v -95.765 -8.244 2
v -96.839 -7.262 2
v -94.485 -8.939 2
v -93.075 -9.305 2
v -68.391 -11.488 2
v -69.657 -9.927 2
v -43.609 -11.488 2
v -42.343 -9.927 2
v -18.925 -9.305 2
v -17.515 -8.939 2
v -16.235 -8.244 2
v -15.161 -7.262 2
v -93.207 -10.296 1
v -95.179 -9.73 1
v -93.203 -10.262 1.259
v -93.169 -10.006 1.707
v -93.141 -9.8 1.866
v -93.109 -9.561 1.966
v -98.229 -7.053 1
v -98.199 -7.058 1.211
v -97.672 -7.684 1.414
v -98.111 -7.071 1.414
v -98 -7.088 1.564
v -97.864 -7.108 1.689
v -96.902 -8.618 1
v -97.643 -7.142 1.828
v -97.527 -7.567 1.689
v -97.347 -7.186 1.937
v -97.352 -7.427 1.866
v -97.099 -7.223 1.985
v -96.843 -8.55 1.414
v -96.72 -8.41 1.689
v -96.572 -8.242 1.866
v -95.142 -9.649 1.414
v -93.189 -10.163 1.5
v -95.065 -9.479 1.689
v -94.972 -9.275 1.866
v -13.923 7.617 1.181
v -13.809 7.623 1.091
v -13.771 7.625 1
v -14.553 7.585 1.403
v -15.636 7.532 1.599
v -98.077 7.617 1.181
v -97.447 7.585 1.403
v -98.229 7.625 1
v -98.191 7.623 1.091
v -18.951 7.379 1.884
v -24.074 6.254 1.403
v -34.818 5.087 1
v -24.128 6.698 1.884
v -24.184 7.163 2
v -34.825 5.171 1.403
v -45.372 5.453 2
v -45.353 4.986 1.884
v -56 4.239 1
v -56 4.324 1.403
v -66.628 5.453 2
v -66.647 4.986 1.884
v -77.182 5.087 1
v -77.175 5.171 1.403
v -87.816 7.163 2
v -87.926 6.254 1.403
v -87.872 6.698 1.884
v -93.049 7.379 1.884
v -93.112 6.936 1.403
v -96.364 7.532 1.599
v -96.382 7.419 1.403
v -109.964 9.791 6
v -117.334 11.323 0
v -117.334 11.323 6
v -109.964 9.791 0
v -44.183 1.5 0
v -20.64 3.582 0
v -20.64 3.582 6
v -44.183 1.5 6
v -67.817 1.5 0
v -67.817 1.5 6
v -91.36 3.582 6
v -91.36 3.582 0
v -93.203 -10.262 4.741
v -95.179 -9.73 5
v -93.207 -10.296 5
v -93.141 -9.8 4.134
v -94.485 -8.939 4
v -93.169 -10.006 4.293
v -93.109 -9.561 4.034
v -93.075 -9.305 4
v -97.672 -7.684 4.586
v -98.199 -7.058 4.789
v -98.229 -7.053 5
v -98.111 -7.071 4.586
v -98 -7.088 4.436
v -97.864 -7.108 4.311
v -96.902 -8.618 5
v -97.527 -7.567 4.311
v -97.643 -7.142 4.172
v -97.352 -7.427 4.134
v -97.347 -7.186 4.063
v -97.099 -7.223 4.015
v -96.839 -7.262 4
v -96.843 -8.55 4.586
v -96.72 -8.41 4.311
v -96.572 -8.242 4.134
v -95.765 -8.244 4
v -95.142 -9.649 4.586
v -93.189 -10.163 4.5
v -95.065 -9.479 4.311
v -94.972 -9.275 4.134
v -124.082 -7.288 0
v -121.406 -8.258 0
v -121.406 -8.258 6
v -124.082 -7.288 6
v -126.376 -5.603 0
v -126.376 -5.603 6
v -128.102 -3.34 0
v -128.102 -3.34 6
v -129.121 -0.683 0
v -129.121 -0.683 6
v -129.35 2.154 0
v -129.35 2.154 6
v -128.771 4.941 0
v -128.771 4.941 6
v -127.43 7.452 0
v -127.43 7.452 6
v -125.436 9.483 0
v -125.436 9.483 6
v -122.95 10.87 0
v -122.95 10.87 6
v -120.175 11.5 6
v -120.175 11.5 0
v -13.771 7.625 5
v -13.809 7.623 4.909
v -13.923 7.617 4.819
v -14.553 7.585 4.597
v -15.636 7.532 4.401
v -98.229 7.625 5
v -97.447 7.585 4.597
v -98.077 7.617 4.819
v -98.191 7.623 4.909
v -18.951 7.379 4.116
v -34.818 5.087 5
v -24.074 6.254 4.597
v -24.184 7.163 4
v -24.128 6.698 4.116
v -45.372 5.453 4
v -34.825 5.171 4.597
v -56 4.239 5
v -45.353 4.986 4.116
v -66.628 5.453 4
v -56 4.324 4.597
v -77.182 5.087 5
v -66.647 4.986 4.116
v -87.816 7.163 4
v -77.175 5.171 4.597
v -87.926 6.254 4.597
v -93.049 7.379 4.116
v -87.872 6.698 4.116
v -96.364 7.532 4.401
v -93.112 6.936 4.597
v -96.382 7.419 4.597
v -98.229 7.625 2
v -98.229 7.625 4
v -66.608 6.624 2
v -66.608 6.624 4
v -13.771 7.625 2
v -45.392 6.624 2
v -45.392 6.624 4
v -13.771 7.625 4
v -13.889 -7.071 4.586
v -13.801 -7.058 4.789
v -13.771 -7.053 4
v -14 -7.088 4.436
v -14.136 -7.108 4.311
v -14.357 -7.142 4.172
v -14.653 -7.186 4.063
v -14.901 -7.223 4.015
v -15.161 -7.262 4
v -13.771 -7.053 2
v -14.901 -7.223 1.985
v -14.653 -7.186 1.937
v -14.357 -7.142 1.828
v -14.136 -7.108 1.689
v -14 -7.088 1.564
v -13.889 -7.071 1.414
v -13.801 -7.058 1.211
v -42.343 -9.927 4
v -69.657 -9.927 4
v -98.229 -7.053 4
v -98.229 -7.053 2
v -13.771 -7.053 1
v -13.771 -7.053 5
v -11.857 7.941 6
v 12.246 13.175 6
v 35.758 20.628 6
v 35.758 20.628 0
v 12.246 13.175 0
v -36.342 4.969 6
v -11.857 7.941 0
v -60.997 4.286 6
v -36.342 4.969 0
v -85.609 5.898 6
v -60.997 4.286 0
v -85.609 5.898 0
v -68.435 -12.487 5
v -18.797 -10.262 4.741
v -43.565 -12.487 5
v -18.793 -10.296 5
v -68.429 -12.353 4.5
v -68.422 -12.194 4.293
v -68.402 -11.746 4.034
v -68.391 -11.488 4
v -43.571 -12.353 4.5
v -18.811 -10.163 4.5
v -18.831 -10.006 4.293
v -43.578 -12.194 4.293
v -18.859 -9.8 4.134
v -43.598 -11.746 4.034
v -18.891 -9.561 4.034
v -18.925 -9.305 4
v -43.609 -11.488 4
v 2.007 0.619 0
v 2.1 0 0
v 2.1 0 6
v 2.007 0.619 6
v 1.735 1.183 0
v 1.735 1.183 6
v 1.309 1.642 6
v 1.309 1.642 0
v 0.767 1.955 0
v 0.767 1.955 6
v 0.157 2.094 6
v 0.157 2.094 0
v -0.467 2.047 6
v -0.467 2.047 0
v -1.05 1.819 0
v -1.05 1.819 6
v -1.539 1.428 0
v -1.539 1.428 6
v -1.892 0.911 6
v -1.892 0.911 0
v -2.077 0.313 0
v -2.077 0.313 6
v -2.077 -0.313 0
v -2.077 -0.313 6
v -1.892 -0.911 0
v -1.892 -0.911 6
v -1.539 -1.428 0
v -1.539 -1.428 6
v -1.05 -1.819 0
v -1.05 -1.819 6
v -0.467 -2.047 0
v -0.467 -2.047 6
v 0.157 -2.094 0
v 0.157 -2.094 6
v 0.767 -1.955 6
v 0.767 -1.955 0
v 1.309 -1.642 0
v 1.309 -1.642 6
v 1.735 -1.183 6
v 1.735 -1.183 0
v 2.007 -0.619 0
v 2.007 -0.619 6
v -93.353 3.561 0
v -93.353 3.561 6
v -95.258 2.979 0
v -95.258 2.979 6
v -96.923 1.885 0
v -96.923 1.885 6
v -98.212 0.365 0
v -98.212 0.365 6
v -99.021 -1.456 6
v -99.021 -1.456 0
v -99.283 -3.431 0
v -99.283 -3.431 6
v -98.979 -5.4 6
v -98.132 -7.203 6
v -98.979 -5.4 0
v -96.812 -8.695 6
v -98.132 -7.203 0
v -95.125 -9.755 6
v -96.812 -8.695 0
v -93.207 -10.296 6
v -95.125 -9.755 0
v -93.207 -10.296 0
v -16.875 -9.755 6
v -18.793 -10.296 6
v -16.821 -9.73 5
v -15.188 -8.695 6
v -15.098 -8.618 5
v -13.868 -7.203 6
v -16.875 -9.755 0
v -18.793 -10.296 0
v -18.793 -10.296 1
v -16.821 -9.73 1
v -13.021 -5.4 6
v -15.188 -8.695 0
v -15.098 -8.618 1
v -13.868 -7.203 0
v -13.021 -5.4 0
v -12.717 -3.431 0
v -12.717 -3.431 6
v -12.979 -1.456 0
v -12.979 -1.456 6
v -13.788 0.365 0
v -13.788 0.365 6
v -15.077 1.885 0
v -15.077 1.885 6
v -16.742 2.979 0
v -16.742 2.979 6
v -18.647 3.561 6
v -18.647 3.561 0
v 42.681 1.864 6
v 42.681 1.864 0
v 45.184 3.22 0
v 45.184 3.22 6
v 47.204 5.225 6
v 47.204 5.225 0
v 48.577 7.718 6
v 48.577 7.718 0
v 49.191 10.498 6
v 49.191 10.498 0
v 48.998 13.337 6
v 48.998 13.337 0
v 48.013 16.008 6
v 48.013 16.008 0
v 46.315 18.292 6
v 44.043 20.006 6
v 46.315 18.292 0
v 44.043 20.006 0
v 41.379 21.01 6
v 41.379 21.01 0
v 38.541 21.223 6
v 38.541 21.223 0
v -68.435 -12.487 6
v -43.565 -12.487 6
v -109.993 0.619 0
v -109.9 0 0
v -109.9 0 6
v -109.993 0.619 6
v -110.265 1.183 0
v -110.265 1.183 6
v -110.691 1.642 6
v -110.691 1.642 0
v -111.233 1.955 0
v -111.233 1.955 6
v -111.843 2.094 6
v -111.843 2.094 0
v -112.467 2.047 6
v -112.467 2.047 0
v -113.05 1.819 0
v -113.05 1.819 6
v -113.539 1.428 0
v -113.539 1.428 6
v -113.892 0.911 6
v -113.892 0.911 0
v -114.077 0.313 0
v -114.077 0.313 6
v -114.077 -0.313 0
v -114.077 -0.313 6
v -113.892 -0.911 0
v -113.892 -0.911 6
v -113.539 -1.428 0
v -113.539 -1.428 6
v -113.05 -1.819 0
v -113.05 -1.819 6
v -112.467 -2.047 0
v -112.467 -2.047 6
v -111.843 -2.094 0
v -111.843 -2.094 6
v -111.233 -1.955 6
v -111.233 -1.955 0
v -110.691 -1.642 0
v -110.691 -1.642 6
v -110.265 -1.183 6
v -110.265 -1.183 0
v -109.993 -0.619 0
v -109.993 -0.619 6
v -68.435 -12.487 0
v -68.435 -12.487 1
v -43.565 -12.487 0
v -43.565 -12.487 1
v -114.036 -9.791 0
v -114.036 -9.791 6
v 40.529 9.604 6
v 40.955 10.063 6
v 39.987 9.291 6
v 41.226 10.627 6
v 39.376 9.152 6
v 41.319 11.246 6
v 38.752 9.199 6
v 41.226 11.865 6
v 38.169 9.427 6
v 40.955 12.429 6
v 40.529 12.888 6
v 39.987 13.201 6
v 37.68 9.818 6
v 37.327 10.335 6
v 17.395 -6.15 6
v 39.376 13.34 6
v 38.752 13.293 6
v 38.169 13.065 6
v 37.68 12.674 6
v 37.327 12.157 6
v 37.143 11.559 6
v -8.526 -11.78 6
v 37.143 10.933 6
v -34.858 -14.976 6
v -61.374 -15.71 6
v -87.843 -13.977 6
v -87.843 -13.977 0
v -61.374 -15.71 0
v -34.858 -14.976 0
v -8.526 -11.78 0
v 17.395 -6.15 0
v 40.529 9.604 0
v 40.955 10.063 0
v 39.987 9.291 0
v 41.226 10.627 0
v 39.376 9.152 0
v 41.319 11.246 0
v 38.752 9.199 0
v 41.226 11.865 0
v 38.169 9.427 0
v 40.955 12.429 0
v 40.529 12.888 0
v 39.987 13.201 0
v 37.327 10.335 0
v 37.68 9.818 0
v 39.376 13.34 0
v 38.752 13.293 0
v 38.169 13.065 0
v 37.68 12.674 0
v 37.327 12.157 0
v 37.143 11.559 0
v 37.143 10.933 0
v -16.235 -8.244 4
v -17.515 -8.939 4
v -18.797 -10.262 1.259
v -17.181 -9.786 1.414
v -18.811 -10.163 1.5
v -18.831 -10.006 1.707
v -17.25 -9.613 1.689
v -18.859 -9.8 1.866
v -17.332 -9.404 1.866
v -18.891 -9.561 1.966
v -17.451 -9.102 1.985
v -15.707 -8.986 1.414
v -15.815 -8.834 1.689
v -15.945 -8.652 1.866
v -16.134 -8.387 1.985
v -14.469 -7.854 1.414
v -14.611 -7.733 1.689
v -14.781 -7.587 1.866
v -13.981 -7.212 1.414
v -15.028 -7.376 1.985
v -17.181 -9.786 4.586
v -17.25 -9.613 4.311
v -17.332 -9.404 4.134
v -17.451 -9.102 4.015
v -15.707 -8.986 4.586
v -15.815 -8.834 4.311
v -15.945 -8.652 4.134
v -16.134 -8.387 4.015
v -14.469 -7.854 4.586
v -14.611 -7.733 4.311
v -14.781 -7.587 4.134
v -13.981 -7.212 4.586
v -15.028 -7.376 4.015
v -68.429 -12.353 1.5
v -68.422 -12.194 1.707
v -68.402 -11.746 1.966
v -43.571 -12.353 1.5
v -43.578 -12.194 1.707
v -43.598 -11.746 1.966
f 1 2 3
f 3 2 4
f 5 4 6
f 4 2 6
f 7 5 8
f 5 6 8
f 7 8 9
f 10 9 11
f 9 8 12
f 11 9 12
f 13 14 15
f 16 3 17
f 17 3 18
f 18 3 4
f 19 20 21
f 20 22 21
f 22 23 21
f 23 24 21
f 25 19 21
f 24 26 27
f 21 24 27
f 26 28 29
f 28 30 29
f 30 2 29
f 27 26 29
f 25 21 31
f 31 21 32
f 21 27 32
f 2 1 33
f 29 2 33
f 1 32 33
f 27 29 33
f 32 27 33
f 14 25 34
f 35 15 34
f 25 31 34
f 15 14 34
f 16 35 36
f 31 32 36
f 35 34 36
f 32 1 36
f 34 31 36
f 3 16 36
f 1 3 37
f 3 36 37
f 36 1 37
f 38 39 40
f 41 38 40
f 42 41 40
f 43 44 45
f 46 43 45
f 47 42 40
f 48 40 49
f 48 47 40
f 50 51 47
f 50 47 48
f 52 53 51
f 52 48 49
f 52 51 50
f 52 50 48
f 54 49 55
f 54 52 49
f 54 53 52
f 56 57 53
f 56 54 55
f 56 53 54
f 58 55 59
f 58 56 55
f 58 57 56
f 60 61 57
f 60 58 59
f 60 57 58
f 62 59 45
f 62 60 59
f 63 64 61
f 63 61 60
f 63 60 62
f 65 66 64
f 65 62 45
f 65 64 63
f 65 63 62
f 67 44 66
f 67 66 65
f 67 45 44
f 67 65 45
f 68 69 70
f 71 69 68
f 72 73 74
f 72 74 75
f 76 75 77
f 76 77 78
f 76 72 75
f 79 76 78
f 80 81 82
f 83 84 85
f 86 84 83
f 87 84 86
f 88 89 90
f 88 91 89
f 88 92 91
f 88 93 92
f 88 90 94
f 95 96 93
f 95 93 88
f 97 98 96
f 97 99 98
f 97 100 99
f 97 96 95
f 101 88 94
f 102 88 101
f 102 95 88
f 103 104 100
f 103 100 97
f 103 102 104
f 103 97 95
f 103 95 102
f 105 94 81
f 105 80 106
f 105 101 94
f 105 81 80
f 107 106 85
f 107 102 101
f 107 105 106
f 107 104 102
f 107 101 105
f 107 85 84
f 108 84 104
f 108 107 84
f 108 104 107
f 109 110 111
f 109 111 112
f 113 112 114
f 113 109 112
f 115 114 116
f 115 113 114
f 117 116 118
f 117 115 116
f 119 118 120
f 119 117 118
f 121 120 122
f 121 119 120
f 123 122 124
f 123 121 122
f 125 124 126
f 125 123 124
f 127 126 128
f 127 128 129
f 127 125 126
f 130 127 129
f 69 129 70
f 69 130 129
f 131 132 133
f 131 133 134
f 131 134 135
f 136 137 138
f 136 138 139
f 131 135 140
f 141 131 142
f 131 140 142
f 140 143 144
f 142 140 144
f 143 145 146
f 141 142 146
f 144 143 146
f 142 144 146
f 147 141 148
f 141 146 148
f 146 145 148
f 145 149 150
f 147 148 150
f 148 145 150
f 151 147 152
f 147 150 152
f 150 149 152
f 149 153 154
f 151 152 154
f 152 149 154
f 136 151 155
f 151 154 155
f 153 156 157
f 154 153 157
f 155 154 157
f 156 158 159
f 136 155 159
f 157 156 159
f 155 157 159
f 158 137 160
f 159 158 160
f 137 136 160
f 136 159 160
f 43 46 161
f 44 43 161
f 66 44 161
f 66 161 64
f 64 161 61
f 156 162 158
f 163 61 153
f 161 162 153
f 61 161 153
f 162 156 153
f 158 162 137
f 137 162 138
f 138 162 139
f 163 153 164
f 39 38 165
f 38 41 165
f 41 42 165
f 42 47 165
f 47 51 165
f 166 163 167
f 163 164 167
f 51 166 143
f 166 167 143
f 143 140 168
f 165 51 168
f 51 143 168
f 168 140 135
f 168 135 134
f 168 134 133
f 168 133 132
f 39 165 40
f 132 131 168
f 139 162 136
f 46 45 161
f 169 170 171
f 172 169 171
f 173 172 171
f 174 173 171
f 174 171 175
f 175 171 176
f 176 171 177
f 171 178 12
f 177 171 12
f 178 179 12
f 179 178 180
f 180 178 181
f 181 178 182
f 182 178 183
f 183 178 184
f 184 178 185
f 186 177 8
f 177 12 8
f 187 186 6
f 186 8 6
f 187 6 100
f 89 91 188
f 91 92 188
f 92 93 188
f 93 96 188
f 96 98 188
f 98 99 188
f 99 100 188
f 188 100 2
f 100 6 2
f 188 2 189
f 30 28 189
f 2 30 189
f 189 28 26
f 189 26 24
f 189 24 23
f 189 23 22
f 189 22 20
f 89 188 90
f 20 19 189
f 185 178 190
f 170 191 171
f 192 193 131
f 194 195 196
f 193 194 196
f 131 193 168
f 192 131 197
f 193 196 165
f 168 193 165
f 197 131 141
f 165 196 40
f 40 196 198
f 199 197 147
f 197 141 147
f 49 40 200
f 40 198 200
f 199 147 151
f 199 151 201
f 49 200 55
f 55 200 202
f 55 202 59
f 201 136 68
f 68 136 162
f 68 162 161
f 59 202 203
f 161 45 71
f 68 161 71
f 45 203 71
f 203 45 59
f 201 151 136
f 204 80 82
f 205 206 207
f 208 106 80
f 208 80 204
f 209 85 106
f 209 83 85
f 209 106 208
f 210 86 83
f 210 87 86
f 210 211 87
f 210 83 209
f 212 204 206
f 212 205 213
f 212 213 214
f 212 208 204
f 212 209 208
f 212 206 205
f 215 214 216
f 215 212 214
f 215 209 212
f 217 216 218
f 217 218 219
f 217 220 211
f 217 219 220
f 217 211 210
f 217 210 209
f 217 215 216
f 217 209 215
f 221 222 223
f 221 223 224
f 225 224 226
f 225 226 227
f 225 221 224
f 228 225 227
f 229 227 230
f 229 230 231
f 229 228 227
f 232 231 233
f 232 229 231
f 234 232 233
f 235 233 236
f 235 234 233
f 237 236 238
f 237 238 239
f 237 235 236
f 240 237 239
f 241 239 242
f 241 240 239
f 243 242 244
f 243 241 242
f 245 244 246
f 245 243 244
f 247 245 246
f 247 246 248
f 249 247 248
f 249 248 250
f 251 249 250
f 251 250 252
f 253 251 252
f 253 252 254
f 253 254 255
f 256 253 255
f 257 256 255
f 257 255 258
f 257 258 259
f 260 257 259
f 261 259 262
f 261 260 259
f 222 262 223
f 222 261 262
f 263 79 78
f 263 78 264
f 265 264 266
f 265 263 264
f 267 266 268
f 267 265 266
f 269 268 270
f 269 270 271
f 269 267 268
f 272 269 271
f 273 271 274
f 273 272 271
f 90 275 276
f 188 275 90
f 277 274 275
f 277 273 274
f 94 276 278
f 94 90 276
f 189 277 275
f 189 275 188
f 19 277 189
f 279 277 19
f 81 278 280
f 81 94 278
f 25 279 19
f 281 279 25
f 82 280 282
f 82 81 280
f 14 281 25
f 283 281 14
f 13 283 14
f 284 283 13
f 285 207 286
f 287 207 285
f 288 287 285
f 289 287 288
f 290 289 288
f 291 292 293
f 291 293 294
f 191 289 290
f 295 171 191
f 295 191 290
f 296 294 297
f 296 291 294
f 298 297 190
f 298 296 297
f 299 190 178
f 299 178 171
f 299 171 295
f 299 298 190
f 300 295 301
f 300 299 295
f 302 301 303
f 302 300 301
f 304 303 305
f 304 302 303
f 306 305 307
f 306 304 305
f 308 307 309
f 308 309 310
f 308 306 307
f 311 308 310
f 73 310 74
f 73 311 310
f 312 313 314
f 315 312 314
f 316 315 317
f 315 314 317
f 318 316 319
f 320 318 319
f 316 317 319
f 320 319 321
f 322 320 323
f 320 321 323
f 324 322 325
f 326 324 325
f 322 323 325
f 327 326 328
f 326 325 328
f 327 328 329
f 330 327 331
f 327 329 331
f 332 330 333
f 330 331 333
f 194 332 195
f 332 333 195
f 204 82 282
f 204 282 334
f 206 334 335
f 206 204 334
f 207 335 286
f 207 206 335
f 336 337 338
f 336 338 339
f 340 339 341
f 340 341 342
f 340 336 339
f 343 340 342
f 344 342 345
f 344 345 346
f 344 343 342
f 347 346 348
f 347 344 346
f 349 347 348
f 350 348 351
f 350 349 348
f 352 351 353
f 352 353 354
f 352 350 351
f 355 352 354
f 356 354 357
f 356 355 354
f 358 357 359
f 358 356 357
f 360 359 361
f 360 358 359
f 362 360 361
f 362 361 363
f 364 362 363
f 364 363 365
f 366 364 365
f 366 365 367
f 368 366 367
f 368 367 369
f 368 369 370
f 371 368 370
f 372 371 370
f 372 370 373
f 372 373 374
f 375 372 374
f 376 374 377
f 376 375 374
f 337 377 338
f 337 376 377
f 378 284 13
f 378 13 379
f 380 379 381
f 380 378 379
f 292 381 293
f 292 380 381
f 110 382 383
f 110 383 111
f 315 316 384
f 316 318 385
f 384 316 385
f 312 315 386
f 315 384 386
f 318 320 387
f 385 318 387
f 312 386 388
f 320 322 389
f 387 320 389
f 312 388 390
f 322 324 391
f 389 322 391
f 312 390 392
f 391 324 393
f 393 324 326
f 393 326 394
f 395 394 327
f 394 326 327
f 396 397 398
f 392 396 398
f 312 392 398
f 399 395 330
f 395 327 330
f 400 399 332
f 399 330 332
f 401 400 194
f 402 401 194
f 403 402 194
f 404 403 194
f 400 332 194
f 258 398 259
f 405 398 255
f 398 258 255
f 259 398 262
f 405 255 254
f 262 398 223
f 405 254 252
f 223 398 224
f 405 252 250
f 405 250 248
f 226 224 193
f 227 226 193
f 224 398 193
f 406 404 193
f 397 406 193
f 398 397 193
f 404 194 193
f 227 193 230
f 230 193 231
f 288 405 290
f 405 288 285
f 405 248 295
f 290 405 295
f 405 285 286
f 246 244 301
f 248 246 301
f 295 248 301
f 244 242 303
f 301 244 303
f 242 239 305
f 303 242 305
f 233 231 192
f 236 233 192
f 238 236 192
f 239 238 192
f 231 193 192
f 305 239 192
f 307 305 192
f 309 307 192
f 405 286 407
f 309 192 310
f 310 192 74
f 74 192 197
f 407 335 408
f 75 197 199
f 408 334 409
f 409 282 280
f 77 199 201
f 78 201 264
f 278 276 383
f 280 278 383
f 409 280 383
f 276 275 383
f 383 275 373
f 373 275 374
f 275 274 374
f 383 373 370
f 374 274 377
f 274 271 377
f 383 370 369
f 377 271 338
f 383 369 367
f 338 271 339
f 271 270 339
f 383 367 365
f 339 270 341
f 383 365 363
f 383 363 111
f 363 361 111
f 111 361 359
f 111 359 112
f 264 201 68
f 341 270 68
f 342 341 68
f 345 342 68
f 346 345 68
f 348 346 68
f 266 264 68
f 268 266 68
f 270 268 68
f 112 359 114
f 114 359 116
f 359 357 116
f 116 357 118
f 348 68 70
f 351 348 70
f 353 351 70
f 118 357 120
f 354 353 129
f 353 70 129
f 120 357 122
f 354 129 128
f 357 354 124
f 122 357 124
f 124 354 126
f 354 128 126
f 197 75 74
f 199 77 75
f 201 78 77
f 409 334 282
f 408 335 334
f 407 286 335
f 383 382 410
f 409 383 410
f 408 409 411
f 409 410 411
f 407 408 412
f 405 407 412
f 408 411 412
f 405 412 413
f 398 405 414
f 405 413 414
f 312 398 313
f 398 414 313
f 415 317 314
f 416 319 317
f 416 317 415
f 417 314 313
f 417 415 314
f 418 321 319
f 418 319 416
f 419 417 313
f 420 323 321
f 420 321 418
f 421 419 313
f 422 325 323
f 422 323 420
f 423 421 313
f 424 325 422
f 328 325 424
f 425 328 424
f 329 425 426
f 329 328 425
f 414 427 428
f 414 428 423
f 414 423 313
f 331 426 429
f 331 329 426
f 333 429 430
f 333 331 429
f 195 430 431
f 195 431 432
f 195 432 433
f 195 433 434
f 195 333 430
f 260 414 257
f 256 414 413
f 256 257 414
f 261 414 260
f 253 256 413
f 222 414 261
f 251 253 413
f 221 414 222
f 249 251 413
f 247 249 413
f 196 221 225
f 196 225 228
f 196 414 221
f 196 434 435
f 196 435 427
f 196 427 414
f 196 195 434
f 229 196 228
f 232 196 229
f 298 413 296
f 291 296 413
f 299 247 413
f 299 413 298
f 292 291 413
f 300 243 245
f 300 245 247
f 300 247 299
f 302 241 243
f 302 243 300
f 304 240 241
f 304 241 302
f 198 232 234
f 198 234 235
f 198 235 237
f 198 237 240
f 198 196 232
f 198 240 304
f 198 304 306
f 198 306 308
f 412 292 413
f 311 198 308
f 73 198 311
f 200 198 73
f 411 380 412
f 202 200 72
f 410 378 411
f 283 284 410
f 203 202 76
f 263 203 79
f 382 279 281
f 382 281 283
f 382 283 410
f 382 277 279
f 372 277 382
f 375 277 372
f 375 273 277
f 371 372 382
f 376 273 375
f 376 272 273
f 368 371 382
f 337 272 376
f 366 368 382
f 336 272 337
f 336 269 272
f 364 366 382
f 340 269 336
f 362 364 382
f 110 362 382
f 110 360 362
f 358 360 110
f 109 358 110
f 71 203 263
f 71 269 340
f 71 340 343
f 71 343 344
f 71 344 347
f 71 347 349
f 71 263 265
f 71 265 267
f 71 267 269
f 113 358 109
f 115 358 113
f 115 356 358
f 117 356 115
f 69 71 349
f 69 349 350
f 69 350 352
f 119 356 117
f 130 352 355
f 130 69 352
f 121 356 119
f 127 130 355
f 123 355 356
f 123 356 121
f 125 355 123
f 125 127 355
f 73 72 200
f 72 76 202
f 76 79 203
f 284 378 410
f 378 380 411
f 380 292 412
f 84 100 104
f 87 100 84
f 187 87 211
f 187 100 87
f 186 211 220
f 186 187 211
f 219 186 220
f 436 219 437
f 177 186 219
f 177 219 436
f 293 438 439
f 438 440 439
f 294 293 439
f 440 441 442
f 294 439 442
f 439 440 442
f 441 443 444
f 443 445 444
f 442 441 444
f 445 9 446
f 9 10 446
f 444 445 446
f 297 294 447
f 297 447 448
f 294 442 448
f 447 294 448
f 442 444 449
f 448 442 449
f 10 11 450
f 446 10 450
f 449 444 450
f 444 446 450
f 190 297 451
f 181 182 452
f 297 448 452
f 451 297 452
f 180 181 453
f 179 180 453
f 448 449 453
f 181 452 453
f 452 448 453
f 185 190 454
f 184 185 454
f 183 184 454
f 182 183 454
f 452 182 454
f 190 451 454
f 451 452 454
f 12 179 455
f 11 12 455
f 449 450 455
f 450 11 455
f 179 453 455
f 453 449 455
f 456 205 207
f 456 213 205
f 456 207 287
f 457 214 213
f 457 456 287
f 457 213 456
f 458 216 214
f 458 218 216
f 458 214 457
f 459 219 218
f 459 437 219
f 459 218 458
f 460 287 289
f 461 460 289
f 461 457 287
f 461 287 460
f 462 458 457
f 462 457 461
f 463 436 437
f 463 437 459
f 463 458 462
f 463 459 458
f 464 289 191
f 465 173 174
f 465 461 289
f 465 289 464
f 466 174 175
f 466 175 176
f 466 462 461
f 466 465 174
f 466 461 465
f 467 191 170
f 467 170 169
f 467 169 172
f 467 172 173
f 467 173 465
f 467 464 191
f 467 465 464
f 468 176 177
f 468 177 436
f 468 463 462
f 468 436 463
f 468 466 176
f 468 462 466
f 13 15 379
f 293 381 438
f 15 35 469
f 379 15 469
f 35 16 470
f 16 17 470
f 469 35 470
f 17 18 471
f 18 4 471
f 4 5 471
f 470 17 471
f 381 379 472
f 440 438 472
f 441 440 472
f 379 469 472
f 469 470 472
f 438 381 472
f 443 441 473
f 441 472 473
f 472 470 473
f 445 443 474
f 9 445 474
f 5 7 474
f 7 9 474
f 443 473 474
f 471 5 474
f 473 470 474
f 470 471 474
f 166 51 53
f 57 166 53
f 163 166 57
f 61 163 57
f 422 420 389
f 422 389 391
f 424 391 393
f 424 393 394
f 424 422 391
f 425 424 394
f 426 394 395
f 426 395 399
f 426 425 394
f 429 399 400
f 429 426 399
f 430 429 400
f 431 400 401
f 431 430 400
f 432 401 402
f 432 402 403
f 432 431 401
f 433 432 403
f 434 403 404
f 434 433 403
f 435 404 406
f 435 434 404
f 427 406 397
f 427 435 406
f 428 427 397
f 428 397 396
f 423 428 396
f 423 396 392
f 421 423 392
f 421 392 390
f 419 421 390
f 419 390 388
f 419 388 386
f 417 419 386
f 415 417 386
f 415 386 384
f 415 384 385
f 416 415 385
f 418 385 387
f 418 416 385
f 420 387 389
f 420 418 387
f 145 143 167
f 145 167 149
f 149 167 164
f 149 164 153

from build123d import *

# Parameters (mm, degrees)
CROQUIS1_R              = 2.1
SALIENTE_EXTRUIR1_DEPTH = 6
SALIENTE_EXTRUIR3_DEPTH = 1
REDONDEO2_R             = 1
SALIENTE_EXTRUIR5_DEPTH = 6


with BuildPart() as part:
    # Croquis1 → Saliente-Extruir1 (new body)
    with BuildSketch(Plane.XY):
        with BuildLine():
            ThreePointArc((-114.035873061, -9.790567955), (-34.858360528, -14.975714339), (42.681169488, 1.864283248))
            ThreePointArc((42.681169488, 1.864283248), (48.601198063, 14.707696411), (35.7577849, 20.627724986))
            ThreePointArc((35.7577849, 20.627724986), (-36.341639472, 4.969206908), (-109.964126939, 9.790567955))
            ThreePointArc((-109.964126939, 9.790567955), (-121.790567955, 2.035873061), (-114.035873061, -9.790567955))
        make_face()
        with Locations((-112, 0)):
            Circle(CROQUIS1_R, mode=Mode.SUBTRACT)
        with Locations((39.219477194, 11.246004117)):
            Circle(CROQUIS1_R, mode=Mode.SUBTRACT)
        Circle(CROQUIS1_R, mode=Mode.SUBTRACT)
        with BuildLine():
            ThreePointArc((-18.792854848, -10.296017287), (-12.777386897, -2.433820054), (-20.63958413, 3.581647897))
            ThreePointArc((-20.63958413, 3.581647897), (-56, 1.239230948), (-91.36041587, 3.581647897))
            ThreePointArc((-91.36041587, 3.581647897), (-99.222613103, -2.433820054), (-93.207145152, -10.296017287))
            ThreePointArc((-93.207145152, -10.296017287), (-56, -12.760769052), (-18.792854848, -10.296017287))
        make_face(mode=Mode.SUBTRACT)
    extrude(amount=SALIENTE_EXTRUIR1_DEPTH)

    # Croquis3 → Saliente-Extruir3 (add, symmetric)
    with BuildSketch(Plane.XY.offset(3)):
        with BuildLine():
            ThreePointArc((-98.228577232, -7.053046158), (-96.081427883, -9.237480134), (-93.207145152, -10.296017287))
            ThreePointArc((-93.207145152, -10.296017287), (-56, -12.760769052), (-18.792854848, -10.296017287))
            ThreePointArc((-18.792854848, -10.296017287), (-15.918572117, -9.237480134), (-13.771422768, -7.053046158))
            ThreePointArc((-13.771422768, -7.053046158), (-56, -10.260769052), (-98.228577232, -7.053046158))
        make_face()
        with BuildLine():
            ThreePointArc((-98.228577232, 7.624636675), (-56, 6.557109307), (-13.771422768, 7.624636675))
            ThreePointArc((-13.771422768, 7.624636675), (-56, 4.239230948), (-98.228577232, 7.624636675))
        make_face()
    extrude(amount=SALIENTE_EXTRUIR3_DEPTH, both=True)

    # Redondeo2
    redondeo2_edges = [part.edges().sort_by_distance(p)[0] for p in [
        (-96.081427883, -9.237480134, 2),
        (-56, -12.760769052, 2),
        (-15.918572117, -9.237480134, 2),
        (-96.081427883, -9.237480134, 4),
        (-56, -12.760769052, 4),
        (-15.918572117, -9.237480134, 4),
        (-56, 4.239230948, 2),
        (-56, 4.239230948, 4),
    ]]
    fillet(redondeo2_edges, radius=REDONDEO2_R)

    # Croquis1<3> → Saliente-Extruir5 (add)
    with BuildSketch(Plane.XY):
        with BuildLine():
            ThreePointArc((-121.405666345, -8.258076308), (-129.160361239, 3.568364708), (-117.333920224, 11.323059602))
            Line((-117.333920224, 11.323059602), (-109.964126939, 9.790567955))
            ThreePointArc((-109.964126939, 9.790567955), (-121.790567955, 2.035873061), (-114.035873061, -9.790567955))
            Line((-114.035873061, -9.790567955), (-121.405666345, -8.258076308))
        make_face()
    extrude(amount=SALIENTE_EXTRUIR5_DEPTH)


solid = part.part
